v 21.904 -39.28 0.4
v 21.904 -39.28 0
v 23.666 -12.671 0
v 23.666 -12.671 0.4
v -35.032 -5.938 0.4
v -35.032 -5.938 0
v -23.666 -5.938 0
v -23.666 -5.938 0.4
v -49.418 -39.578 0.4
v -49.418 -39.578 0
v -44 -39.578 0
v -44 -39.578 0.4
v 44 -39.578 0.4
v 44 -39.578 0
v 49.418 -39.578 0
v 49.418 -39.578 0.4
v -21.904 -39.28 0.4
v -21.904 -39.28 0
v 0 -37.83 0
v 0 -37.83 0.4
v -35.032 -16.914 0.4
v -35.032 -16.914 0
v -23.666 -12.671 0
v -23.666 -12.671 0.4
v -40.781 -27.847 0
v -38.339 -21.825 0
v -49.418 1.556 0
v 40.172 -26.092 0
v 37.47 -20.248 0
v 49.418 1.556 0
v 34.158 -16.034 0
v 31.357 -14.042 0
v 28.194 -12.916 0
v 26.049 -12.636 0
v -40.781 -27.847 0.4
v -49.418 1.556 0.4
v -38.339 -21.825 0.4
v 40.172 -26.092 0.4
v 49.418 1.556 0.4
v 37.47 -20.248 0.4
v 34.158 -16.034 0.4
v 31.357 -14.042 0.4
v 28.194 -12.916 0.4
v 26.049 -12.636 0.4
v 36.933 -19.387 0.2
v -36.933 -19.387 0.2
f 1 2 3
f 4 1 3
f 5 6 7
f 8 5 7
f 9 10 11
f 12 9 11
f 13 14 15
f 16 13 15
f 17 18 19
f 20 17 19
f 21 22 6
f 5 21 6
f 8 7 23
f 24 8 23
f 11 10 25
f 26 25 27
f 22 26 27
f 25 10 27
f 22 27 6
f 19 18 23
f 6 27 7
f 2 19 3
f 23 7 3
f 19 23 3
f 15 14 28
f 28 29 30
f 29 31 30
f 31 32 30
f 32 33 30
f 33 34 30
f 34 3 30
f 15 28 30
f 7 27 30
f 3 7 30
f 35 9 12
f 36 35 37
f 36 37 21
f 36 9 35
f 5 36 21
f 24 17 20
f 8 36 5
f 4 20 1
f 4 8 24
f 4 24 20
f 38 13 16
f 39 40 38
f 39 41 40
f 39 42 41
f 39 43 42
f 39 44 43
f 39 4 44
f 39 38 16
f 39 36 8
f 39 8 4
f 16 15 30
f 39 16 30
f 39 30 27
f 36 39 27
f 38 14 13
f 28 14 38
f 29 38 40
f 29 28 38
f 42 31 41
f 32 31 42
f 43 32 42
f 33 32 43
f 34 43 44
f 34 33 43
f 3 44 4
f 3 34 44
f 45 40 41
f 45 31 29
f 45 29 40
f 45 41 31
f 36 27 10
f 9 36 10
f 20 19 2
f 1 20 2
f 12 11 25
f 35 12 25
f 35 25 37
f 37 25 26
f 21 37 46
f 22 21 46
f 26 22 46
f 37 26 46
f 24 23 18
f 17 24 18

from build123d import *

# Parameters (mm, degrees)
F1_DEPTH = 0.4


with BuildPart() as f1:
    # F0 (on Top) → F1 (new body)
    with BuildSketch(Plane.XY):
        with BuildLine():
            Line((-21.9038240612, -39.2802841961), (0, -37.8296988058))
            Line((0, -37.8296988058), (0, 1.5558084287))
            Line((0, 1.5558084287), (-49.4176484644, 1.5558084287))
            Line((-49.4176484644, 1.5558084287), (-49.4176484644, -39.5778827369))
            Line((-49.4176484644, -39.5778827369), (-44, -39.5778827369))
            add(Edge.make_bspline(
                [(-44, -39.5778827369), (-41.9009812176, -31.3107147813), (-39.967373394, -23.2768925028), (-35.7254609829, -17.6712276554), (-35.032177344, -16.9143821545)],
                knots=[0, 0, 0, 0, 0.545331607, 0.6402959588, 0.6402959588, 0.6402959588, 0.6402959588], degree=3))
            Line((-35.032177344, -16.9143821545), (-35.032177344, -5.9383278713))
            Line((-35.032177344, -5.9383278713), (-23.665998131, -5.9383278713))
            Line((-23.665998131, -5.9383278713), (-23.665998131, -12.6714743674))
            Line((-23.665998131, -12.6714743674), (-21.9038240612, -39.2802841961))
        make_face()
        with BuildLine():
            Line((21.9038240612, -39.2802841961), (23.665998131, -12.6714743674))
            add(Edge.make_bspline(
                [(44, -39.5778827369), (41.9009812176, -31.3107147813), (38.8811154869, -18.7636696725), (30.2309490173, -12.1392643454), (23.665998131, -12.6714743674)],
                knots=[0, 0, 0, 0, 0.545331607, 1, 1, 1, 1], degree=3))
            Line((44, -39.5778827369), (49.4176484644, -39.5778827369))
            Line((49.4176484644, -39.5778827369), (49.4176484644, 1.5558084287))
            Line((49.4176484644, 1.5558084287), (0, 1.5558084287))
            Line((0, 1.5558084287), (0, -37.8296988058))
            Line((0, -37.8296988058), (21.9038240612, -39.2802841961))
        make_face()
    extrude(amount=F1_DEPTH)


solid = f1.part
